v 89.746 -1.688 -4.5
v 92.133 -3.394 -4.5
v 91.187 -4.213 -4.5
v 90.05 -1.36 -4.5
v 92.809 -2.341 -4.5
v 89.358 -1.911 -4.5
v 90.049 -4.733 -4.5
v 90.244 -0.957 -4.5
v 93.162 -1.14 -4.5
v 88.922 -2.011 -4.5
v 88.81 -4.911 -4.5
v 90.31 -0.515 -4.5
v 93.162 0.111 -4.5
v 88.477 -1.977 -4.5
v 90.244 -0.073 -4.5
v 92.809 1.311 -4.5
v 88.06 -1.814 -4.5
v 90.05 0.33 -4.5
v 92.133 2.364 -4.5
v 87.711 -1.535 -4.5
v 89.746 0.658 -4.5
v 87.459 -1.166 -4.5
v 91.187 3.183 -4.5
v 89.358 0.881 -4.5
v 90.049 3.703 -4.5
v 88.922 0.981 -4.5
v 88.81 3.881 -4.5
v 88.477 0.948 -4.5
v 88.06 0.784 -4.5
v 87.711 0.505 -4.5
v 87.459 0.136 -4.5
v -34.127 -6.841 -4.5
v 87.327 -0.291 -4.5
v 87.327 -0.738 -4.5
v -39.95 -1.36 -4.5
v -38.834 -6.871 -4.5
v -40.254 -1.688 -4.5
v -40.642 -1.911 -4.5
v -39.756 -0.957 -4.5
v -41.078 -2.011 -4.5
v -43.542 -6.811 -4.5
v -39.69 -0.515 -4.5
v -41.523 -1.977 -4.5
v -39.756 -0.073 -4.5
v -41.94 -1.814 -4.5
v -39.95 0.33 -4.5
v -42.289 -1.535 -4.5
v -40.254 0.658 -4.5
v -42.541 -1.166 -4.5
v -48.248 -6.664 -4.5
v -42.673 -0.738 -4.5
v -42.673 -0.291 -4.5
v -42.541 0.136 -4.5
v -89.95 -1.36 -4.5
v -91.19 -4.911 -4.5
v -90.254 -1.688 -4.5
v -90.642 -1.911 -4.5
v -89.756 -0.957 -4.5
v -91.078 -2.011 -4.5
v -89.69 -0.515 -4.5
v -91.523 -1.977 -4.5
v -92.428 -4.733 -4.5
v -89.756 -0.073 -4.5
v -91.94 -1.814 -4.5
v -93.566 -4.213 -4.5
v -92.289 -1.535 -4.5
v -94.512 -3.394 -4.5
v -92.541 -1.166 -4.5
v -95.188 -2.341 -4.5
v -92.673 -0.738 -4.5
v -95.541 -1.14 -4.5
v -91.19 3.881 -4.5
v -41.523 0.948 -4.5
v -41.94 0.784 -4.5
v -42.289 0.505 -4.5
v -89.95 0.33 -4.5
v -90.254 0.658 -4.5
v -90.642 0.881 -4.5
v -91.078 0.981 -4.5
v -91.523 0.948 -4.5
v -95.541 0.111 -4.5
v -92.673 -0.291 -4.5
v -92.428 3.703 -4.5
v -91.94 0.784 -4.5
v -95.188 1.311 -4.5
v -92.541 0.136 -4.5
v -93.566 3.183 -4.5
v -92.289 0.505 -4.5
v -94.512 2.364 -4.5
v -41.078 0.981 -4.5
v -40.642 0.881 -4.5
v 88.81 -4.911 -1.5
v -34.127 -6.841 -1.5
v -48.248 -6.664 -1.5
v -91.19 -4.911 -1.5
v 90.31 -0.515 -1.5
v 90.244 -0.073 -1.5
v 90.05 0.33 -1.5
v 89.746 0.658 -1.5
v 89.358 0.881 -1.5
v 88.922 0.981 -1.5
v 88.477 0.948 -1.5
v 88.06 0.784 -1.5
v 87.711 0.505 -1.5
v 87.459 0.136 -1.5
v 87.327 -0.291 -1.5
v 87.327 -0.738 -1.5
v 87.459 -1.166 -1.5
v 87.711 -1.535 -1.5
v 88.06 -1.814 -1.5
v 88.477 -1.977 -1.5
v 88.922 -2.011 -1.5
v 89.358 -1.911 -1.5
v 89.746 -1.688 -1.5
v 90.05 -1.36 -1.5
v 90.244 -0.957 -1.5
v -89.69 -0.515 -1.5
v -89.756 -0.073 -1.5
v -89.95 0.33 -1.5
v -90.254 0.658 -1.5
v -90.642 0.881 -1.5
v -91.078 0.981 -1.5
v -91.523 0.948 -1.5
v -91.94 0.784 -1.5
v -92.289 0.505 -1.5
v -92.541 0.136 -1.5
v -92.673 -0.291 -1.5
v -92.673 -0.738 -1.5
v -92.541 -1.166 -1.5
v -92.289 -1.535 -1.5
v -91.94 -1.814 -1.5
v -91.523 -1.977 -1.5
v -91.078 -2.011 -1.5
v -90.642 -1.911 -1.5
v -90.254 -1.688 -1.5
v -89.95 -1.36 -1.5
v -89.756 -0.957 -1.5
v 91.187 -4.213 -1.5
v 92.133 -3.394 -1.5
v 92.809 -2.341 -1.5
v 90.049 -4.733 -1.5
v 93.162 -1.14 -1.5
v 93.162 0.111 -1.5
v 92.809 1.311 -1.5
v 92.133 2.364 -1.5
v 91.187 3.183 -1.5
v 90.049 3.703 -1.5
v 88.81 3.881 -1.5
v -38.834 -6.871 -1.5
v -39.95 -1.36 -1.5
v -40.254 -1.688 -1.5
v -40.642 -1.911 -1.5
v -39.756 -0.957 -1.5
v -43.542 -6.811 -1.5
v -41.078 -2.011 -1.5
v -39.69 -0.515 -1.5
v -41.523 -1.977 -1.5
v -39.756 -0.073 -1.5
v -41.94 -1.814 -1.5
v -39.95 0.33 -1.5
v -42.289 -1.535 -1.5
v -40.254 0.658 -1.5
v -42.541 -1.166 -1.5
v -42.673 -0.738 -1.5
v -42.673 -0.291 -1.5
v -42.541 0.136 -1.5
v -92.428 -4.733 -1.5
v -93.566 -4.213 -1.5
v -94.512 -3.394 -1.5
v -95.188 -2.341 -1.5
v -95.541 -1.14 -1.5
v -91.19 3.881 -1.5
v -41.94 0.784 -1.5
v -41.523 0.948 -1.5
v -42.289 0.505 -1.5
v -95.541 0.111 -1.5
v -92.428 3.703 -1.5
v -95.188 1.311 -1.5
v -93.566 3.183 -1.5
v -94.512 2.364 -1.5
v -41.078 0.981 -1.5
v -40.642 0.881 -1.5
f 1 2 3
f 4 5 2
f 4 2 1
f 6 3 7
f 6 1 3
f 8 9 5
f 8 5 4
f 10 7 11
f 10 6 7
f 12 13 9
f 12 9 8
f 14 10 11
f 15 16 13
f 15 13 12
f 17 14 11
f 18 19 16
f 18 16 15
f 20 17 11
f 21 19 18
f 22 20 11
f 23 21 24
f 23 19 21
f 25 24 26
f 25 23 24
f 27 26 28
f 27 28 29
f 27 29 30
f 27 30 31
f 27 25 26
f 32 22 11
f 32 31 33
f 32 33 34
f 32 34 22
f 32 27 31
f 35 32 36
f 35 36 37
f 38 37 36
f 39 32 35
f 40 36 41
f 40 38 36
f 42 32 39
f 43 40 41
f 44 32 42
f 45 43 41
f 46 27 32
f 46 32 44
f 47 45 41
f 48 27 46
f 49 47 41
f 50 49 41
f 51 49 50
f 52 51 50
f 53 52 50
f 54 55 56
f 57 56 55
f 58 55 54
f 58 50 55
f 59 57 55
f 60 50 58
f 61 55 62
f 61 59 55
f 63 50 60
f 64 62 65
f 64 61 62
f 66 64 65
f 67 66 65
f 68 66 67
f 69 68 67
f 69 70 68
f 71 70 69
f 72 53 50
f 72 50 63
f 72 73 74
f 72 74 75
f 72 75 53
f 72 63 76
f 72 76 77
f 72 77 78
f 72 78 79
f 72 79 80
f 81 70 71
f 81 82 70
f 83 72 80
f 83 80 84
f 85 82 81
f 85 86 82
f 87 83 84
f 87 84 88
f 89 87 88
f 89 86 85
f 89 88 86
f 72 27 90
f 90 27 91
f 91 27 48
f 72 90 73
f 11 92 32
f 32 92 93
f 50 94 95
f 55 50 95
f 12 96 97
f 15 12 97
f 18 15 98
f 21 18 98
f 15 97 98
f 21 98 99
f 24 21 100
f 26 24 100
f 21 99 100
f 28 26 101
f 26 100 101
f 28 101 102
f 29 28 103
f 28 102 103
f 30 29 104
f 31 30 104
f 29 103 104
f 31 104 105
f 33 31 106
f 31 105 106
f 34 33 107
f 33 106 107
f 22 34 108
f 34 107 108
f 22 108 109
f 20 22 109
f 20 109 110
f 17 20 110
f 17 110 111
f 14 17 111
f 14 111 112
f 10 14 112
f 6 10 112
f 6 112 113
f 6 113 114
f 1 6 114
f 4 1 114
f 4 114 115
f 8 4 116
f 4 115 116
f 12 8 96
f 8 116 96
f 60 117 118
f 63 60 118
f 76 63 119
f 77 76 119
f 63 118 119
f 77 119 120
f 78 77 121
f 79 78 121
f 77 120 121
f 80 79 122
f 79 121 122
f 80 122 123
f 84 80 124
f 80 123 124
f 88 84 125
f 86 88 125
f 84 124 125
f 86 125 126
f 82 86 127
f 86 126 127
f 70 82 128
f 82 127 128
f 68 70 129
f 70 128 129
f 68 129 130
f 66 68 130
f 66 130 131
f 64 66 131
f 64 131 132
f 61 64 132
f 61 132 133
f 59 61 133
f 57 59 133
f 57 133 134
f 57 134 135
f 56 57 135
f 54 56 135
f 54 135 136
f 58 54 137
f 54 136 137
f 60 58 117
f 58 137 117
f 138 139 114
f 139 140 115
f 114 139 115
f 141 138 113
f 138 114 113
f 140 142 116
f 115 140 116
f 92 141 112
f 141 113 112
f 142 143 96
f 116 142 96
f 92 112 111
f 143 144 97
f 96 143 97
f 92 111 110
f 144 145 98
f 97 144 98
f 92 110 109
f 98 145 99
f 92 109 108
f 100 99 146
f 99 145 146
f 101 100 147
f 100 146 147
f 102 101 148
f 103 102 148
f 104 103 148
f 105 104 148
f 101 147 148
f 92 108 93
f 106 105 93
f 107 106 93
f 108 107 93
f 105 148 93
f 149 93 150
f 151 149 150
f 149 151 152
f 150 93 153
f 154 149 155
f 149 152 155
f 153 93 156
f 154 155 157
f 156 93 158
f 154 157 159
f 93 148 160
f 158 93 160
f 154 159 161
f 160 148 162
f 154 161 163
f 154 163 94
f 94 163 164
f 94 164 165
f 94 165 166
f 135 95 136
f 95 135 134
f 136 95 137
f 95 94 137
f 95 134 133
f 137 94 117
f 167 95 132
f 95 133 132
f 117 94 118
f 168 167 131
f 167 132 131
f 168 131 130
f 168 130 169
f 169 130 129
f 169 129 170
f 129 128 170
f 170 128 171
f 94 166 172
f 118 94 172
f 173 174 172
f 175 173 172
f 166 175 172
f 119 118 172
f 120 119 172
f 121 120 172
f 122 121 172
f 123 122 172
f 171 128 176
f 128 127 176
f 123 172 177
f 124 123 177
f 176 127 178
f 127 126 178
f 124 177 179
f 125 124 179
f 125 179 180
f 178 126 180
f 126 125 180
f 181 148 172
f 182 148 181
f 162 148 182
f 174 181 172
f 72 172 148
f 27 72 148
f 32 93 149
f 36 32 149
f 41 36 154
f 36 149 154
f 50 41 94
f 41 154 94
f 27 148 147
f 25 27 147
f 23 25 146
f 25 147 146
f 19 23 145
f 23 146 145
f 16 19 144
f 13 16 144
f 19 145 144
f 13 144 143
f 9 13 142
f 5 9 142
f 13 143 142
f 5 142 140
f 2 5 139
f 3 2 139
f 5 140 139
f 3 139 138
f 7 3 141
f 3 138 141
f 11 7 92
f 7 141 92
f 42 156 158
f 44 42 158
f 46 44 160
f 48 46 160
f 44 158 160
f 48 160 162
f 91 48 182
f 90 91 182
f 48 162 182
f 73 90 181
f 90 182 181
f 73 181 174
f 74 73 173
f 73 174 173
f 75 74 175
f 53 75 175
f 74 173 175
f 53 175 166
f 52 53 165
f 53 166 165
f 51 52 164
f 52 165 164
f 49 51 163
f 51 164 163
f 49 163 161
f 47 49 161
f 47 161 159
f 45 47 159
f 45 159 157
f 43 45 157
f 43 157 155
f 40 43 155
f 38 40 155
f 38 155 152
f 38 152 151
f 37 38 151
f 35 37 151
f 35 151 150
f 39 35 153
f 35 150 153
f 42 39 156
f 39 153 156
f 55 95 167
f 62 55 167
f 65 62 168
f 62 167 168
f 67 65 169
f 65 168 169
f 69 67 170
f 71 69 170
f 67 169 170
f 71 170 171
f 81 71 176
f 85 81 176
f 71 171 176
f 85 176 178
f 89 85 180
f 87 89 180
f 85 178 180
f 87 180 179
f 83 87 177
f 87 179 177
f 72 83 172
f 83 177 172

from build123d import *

# Parameters (mm, degrees)
SKETCH1_R           = 3
BOSS_EXTRUDE1_DEPTH = 6
SCALE1_SCALE        = 0.5


with BuildPart() as part:
    # Sketch1 → Boss-Extrude1 (new body)
    with BuildSketch(Plane.XY):
        with BuildLine():
            Line((-180, 8.791952491), (180, 8.791952491))
            ThreePointArc((180, 8.791952491), (188.791952491, 0), (180, -8.791952491))
            Line((180, -8.791952491), (-65.874044075, -12.652154123))
            ThreePointArc((-65.874044075, -12.652154123), (-79.997495837, -12.674394151), (-94.115941273, -12.297720824))
            Line((-94.115941273, -12.297720824), (-180, -8.791952491))
            ThreePointArc((-180, -8.791952491), (-188.791952491, 0), (-180, 8.791952491))
        make_face()
        with Locations((-180, 0)):
            Circle(SKETCH1_R, mode=Mode.SUBTRACT)
        with Locations((-80, 0)):
            Circle(SKETCH1_R, mode=Mode.SUBTRACT)
        with Locations((180, 0)):
            Circle(SKETCH1_R, mode=Mode.SUBTRACT)
    extrude(amount=-BOSS_EXTRUDE1_DEPTH)


with BuildPart() as part_1:
    # Scale1: scaled about (-2.379309964, -1.029732749, -3)
    add(part.part.scale(SCALE1_SCALE).moved(Location((-1.189654982, -0.514866374, -1.5))))


solid = part_1.part
